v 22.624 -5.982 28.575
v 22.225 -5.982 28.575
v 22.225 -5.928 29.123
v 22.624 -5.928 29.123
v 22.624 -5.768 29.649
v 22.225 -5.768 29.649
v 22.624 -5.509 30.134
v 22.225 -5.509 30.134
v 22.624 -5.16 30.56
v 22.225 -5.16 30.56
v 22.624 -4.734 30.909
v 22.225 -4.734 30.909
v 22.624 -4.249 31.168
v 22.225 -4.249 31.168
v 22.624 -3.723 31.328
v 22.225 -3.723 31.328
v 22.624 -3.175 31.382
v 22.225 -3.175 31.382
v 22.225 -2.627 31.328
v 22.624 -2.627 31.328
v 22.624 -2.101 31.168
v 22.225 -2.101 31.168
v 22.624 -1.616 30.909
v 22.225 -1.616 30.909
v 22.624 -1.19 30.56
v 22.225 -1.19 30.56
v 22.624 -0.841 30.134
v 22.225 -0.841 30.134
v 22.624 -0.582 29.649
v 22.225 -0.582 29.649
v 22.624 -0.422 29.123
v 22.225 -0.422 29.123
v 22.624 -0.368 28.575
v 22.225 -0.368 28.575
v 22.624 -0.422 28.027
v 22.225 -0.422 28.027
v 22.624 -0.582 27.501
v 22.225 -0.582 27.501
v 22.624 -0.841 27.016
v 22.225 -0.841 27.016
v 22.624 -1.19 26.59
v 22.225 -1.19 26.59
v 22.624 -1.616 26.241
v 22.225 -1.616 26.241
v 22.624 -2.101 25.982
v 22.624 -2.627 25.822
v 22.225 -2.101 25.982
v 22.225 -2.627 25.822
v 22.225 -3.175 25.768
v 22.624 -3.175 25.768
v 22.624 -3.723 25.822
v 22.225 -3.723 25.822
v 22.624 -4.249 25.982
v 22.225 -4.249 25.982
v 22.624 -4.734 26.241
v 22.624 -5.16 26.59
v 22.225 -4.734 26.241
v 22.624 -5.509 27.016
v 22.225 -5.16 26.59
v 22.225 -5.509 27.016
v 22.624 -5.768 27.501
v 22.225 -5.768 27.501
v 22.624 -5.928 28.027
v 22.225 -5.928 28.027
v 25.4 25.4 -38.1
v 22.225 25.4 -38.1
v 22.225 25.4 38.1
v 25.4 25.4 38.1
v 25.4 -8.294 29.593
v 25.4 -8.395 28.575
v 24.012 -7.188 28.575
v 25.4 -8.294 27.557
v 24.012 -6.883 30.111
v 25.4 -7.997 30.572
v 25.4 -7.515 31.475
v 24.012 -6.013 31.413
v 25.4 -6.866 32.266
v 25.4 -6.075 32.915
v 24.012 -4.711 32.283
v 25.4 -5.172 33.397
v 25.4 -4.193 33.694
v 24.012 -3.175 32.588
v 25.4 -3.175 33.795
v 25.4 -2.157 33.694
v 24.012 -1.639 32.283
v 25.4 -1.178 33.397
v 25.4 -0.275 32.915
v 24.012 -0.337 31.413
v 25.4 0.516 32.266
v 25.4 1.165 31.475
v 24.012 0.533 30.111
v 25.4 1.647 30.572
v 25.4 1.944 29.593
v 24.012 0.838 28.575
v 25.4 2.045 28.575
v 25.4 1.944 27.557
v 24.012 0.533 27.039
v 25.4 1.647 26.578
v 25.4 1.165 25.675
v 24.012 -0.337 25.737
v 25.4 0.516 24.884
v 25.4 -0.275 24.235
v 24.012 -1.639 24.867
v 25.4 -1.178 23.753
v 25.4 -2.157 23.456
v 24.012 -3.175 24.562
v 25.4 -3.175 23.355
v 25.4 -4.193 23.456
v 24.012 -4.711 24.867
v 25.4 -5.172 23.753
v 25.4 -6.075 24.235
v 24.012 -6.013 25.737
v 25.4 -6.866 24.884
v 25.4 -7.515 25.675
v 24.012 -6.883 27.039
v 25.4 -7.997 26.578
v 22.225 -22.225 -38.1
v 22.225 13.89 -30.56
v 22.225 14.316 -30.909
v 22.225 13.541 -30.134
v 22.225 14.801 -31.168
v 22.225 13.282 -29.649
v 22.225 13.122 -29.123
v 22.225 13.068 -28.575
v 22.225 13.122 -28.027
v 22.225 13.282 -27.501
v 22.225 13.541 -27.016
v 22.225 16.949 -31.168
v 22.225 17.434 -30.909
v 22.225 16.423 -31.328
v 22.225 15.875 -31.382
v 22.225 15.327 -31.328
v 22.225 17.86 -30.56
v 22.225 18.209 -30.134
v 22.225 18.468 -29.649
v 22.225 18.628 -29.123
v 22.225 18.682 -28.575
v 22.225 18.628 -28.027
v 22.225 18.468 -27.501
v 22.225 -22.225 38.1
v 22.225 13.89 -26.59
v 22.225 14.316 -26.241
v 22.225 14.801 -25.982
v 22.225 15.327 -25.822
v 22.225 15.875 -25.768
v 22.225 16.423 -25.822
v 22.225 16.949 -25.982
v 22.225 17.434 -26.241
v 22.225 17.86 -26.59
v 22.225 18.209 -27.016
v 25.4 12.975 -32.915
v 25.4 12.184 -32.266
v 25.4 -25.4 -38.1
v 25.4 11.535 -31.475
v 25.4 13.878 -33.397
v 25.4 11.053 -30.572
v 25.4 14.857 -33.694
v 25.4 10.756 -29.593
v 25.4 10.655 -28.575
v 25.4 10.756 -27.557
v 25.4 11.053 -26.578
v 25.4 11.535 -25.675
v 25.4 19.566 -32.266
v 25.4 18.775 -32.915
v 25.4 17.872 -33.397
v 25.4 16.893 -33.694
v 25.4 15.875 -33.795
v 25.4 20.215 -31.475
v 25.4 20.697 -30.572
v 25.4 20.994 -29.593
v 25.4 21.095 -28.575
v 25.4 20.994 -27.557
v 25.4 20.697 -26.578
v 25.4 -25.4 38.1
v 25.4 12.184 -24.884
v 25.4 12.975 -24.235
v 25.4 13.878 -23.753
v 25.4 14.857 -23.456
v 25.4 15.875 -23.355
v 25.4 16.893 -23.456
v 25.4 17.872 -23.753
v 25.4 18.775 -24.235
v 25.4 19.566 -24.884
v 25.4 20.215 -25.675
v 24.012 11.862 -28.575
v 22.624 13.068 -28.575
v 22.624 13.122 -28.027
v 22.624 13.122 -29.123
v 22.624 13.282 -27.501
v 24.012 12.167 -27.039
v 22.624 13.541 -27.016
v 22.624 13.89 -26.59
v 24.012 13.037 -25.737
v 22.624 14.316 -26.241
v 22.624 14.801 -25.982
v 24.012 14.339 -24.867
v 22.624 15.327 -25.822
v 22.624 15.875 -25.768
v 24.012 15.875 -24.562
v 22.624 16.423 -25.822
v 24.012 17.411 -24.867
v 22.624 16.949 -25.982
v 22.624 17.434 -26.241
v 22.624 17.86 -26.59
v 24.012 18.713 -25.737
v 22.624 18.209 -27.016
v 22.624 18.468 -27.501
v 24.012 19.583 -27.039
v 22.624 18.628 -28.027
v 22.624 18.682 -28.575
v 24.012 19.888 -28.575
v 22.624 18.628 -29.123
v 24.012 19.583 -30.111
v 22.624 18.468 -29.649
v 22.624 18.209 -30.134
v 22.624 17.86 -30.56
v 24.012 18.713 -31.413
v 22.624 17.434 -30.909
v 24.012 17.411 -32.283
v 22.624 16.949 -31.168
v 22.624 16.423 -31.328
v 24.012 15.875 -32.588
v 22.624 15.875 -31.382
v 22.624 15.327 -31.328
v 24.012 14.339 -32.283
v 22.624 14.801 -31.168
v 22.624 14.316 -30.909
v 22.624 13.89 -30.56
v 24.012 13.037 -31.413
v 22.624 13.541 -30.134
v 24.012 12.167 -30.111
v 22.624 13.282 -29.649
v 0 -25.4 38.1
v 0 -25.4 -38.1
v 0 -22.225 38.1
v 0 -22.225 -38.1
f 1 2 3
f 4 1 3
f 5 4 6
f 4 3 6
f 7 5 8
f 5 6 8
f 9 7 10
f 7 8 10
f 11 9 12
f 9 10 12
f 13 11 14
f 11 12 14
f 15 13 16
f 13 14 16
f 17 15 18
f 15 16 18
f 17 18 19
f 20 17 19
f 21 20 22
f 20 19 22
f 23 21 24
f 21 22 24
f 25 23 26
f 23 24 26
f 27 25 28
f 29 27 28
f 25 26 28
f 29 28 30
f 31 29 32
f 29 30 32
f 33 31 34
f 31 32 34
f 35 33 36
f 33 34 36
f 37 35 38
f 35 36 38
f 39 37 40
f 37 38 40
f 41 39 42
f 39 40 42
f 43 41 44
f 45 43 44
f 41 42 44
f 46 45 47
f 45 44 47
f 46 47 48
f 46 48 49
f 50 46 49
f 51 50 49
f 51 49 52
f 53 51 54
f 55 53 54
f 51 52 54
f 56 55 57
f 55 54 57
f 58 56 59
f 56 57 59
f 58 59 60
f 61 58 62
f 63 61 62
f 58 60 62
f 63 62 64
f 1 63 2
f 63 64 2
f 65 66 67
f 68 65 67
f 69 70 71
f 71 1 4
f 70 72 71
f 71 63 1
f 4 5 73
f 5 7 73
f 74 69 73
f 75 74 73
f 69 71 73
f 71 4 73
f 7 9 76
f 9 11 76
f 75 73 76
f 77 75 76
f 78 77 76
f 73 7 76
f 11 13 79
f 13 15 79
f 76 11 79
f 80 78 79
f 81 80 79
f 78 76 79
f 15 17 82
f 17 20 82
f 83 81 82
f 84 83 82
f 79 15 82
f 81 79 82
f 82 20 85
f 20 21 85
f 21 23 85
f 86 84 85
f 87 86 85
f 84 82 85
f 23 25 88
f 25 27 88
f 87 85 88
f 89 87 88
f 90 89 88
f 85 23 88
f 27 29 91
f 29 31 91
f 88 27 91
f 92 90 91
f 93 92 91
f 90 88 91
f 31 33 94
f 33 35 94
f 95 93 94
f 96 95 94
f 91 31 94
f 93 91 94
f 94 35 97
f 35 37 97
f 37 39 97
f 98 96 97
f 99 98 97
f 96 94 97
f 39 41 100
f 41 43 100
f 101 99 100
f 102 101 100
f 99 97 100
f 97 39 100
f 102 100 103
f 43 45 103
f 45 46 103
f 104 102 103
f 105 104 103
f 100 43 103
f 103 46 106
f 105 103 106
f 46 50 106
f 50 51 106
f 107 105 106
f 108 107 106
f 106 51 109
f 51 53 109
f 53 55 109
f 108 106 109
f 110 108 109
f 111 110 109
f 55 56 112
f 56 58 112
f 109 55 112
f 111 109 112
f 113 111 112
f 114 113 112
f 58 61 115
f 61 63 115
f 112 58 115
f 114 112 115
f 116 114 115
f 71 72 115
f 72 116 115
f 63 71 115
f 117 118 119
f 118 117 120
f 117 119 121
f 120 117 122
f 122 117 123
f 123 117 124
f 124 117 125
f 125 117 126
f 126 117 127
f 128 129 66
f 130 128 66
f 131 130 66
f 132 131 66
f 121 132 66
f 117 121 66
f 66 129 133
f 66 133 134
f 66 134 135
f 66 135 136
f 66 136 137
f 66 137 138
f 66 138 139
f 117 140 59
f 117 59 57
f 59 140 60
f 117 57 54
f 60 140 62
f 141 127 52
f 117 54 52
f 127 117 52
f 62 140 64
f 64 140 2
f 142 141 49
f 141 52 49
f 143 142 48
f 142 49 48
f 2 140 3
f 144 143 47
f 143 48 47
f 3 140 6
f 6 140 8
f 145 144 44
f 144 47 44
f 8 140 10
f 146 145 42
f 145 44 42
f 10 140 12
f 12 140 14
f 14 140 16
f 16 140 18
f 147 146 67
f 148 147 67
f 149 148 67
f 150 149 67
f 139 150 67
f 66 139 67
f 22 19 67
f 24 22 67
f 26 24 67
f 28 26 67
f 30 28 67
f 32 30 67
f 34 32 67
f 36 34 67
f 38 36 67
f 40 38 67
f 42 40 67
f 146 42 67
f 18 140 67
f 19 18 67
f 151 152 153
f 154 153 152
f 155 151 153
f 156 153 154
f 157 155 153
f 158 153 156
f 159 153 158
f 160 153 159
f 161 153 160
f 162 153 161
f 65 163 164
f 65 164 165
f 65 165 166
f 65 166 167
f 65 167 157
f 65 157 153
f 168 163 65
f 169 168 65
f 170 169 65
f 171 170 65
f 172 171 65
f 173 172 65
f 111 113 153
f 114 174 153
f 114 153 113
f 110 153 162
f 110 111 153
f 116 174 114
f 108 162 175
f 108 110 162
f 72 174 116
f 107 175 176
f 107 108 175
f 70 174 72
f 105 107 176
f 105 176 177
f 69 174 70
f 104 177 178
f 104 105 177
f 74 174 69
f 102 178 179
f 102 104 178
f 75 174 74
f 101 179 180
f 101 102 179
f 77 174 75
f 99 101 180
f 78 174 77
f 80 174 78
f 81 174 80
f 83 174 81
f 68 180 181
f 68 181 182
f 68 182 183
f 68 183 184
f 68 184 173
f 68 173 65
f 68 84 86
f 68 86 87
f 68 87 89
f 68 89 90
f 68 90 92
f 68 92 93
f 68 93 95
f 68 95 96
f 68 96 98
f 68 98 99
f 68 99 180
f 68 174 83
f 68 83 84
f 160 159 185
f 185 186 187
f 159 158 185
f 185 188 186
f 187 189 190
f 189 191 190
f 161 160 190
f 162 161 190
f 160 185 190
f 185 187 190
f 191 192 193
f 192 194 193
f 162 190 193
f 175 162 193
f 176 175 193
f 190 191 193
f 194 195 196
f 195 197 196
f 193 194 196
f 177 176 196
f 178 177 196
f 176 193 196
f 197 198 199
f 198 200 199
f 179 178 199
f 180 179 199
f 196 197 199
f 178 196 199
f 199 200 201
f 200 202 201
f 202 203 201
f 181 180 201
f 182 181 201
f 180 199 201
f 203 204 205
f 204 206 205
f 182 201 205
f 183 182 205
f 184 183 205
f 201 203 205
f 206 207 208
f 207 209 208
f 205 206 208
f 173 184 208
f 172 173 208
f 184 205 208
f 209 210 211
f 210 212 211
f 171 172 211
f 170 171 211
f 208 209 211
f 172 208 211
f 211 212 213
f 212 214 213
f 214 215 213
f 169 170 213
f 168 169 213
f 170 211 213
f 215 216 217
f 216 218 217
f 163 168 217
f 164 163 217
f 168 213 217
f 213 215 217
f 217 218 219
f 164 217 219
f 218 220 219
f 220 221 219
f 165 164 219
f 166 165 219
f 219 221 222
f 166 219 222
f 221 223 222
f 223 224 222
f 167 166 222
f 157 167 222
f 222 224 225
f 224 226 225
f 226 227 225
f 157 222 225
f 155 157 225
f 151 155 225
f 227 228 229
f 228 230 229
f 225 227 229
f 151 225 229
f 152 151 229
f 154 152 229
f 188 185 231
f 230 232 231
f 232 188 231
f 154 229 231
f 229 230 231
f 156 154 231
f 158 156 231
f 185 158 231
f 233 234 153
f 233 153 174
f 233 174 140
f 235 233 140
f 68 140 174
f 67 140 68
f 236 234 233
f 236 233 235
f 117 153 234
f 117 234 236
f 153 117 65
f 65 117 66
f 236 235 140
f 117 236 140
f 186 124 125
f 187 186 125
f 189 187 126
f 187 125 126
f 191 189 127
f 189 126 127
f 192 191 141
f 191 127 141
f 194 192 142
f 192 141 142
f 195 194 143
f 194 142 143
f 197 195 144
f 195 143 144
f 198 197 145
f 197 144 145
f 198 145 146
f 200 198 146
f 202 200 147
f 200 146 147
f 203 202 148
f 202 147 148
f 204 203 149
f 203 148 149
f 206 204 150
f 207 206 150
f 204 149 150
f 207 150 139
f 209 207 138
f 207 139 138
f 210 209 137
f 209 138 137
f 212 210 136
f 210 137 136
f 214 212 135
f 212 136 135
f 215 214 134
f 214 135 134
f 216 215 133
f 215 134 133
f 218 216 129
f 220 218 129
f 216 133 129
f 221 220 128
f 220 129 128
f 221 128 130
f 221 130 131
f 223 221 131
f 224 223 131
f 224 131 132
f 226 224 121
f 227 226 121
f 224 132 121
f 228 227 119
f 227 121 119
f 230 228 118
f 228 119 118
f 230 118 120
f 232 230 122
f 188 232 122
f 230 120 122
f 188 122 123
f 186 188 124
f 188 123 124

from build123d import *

# Parameters (mm, degrees)
F0_W           = 50.8
F0_H           = 76.2
F1_DEPTH       = 25.4
F3_D           = 5.6134
F3_CSINK_D     = 10.4394
F3_CSINK_ANGLE = 82
F4_W           = 22.225
F4_H           = 47.625
F5_DEPTH       = 76.201


# Not quite as in the source:
# - a feature names something its author has since deleted; it is built from what else it names


with BuildPart() as f1:
    # F0 (on Right) → F1 (new body)
    with BuildSketch(Plane.YZ):
        Rectangle(F0_W, F0_H)
    extrude(amount=F1_DEPTH)

    # F3 (through all)
    with Locations(Plane.YZ.offset(25.4)):
        with Locations((-3.175, 28.575), (15.875, -28.575)):
            CounterSinkHole(F3_D / 2, F3_CSINK_D / 2, counter_sink_angle=F3_CSINK_ANGLE)

    # F4 (on face) → F5 (cut, through all)
    with BuildSketch(Plane.XY.offset(38.1)):
        with Locations((11.1125, 1.5875)):
            Rectangle(F4_W, F4_H)
    extrude(amount=-F5_DEPTH, mode=Mode.SUBTRACT)


solid = f1.part
